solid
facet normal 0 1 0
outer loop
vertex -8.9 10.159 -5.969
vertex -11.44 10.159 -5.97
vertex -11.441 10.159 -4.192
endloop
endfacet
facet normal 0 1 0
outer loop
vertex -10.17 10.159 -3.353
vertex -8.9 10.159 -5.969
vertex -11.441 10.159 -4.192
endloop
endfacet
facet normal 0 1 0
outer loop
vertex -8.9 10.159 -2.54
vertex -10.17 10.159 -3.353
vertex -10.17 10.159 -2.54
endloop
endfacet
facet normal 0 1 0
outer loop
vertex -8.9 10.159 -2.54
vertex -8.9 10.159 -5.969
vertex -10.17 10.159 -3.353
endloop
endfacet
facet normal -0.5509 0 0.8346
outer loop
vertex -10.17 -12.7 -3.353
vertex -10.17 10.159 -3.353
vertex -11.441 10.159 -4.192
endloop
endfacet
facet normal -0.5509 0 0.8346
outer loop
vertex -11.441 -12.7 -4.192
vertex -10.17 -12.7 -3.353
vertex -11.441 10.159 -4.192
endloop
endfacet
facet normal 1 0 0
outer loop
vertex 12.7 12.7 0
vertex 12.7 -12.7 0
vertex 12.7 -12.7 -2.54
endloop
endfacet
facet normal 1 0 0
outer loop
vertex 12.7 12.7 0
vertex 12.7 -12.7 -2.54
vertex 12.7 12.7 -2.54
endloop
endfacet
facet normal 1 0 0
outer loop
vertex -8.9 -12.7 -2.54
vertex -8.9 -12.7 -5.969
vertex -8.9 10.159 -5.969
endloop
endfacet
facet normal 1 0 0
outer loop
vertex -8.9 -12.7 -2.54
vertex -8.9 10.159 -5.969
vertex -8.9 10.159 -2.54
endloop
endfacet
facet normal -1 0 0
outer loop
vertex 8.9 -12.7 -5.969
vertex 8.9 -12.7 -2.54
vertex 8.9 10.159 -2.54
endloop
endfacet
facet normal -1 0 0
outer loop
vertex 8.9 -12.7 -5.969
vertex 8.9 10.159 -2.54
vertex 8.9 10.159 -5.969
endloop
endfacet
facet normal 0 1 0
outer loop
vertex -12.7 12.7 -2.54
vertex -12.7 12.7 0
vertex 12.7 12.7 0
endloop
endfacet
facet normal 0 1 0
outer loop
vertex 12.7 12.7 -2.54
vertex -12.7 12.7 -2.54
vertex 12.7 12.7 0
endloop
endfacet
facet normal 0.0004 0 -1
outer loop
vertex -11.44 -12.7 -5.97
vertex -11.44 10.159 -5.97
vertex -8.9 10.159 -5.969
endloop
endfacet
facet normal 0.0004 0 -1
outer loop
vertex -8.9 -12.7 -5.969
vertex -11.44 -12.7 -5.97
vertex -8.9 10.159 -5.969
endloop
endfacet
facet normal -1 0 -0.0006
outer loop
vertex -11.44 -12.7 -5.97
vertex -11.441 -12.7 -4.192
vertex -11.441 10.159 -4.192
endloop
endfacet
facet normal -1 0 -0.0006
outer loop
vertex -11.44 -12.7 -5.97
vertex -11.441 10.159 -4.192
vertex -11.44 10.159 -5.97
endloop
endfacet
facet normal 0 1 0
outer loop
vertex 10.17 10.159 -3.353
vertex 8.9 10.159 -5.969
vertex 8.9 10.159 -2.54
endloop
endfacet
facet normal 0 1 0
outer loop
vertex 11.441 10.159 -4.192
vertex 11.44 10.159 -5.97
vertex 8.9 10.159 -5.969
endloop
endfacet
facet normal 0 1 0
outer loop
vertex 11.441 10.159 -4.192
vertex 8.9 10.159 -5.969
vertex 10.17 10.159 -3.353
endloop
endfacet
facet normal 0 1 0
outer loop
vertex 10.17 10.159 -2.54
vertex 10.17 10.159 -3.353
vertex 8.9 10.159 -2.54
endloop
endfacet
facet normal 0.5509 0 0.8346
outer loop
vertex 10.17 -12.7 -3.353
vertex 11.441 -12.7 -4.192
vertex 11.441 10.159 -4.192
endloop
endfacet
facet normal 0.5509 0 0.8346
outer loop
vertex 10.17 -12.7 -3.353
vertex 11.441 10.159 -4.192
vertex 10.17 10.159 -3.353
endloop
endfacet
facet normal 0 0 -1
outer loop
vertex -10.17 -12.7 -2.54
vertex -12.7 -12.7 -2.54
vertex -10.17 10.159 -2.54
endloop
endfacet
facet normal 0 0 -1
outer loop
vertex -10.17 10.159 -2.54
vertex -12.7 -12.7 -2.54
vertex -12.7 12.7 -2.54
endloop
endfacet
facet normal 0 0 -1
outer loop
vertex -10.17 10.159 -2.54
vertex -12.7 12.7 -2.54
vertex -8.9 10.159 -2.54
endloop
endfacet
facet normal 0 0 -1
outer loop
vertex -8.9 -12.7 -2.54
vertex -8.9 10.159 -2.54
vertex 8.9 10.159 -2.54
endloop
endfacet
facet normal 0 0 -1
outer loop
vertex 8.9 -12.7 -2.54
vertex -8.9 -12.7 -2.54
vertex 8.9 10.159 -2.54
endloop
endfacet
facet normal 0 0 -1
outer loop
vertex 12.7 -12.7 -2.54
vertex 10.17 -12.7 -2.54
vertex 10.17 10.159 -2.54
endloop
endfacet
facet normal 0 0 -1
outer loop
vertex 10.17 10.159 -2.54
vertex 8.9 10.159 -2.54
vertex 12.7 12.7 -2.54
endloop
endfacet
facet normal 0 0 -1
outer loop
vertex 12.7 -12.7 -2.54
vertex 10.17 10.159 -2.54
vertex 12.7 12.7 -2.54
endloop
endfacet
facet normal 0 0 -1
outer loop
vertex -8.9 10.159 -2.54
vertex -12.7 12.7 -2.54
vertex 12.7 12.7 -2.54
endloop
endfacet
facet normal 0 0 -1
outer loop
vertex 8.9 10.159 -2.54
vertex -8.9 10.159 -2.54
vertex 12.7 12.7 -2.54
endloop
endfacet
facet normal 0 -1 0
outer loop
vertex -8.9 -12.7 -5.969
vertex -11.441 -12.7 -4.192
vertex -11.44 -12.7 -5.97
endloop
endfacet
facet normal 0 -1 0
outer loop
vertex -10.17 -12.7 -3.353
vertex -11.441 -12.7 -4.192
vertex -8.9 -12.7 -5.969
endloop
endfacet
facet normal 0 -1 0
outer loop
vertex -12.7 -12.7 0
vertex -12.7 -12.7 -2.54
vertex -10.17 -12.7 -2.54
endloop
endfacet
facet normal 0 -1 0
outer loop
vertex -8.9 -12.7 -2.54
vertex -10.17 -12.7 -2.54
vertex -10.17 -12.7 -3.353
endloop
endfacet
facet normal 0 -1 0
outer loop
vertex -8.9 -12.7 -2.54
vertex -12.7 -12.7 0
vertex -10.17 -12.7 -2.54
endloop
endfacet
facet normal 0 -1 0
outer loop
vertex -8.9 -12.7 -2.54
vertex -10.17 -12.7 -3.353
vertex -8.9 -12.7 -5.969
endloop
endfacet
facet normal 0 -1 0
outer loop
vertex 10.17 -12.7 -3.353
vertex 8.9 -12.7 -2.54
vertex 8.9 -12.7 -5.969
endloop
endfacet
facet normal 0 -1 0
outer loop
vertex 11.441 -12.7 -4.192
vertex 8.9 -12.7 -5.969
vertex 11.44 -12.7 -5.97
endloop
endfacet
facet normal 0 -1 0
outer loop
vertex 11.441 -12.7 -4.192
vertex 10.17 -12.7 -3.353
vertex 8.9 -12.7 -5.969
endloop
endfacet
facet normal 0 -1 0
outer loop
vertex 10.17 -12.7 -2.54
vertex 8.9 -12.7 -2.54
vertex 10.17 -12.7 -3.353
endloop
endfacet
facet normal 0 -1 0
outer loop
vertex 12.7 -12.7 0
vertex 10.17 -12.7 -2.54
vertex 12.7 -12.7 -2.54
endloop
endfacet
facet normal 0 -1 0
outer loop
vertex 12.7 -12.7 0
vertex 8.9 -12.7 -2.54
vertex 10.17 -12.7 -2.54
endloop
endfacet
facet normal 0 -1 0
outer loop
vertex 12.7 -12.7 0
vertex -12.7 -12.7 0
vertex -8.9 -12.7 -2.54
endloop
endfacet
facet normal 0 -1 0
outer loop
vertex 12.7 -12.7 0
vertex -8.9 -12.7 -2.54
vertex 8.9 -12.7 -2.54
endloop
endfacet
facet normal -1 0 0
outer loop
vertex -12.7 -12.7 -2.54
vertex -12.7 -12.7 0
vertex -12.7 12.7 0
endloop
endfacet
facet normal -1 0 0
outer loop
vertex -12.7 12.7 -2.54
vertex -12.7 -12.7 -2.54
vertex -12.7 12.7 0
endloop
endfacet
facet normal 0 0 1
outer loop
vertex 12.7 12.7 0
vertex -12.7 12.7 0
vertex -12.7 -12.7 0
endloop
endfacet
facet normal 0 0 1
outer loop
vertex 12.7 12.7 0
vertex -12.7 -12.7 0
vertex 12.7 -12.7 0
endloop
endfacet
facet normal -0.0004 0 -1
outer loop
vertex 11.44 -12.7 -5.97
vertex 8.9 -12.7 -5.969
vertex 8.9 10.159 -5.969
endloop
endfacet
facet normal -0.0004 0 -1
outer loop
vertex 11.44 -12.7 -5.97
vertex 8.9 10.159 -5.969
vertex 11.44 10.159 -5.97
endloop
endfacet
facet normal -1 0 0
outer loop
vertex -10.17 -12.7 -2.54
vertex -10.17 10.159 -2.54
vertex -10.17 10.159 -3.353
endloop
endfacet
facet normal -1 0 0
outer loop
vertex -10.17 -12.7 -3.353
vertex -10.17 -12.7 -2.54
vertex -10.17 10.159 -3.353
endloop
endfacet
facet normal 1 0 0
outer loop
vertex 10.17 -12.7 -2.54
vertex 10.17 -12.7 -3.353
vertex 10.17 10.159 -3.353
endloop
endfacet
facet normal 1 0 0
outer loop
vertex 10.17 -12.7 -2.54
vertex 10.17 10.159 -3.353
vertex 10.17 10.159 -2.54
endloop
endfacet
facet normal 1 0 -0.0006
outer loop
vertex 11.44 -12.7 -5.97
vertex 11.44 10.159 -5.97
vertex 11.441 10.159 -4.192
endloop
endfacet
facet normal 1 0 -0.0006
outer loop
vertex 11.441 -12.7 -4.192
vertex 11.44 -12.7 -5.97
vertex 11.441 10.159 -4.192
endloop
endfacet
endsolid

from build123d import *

# Parameters (mm, degrees)
F0_W     = 25.4
F0_H     = 25.4
F1_DEPTH = 2.54
F3_DEPTH = 12.7
F4_W     = 2.540944
F4_H     = 3.556
F5_DEPTH = 12.7


with BuildPart() as f1:
    # F0 (on Top) → F1 (new body)
    with BuildSketch(Plane.XY):
        Rectangle(F0_W, F0_H)
    extrude(amount=-F1_DEPTH)

    # F2 (on Front) → F3 (join, symmetric)
    with BuildSketch(Plane.XZ):
        Polygon((-8.899515, -2.54), (-10.169515, -2.54), (-10.169515, -3.3528), (-11.44146, -4.192284), (-11.439515, -5.970282), (-8.899515, -5.969), align=None)
        Polygon((11.44146, -4.192284), (10.169515, -3.3528), (10.169515, -2.54), (8.899515, -2.54), (8.899515, -5.969), (11.439515, -5.970282), align=None)
    extrude(amount=F3_DEPTH, both=True)

    # F4 (on Right) → F5 (cut, symmetric)
    with BuildSketch(Plane.YZ):
        with Locations((11.429528, -4.318)):
            Rectangle(F4_W, F4_H)
    extrude(amount=F5_DEPTH, both=True, mode=Mode.SUBTRACT)


solid = f1.part
